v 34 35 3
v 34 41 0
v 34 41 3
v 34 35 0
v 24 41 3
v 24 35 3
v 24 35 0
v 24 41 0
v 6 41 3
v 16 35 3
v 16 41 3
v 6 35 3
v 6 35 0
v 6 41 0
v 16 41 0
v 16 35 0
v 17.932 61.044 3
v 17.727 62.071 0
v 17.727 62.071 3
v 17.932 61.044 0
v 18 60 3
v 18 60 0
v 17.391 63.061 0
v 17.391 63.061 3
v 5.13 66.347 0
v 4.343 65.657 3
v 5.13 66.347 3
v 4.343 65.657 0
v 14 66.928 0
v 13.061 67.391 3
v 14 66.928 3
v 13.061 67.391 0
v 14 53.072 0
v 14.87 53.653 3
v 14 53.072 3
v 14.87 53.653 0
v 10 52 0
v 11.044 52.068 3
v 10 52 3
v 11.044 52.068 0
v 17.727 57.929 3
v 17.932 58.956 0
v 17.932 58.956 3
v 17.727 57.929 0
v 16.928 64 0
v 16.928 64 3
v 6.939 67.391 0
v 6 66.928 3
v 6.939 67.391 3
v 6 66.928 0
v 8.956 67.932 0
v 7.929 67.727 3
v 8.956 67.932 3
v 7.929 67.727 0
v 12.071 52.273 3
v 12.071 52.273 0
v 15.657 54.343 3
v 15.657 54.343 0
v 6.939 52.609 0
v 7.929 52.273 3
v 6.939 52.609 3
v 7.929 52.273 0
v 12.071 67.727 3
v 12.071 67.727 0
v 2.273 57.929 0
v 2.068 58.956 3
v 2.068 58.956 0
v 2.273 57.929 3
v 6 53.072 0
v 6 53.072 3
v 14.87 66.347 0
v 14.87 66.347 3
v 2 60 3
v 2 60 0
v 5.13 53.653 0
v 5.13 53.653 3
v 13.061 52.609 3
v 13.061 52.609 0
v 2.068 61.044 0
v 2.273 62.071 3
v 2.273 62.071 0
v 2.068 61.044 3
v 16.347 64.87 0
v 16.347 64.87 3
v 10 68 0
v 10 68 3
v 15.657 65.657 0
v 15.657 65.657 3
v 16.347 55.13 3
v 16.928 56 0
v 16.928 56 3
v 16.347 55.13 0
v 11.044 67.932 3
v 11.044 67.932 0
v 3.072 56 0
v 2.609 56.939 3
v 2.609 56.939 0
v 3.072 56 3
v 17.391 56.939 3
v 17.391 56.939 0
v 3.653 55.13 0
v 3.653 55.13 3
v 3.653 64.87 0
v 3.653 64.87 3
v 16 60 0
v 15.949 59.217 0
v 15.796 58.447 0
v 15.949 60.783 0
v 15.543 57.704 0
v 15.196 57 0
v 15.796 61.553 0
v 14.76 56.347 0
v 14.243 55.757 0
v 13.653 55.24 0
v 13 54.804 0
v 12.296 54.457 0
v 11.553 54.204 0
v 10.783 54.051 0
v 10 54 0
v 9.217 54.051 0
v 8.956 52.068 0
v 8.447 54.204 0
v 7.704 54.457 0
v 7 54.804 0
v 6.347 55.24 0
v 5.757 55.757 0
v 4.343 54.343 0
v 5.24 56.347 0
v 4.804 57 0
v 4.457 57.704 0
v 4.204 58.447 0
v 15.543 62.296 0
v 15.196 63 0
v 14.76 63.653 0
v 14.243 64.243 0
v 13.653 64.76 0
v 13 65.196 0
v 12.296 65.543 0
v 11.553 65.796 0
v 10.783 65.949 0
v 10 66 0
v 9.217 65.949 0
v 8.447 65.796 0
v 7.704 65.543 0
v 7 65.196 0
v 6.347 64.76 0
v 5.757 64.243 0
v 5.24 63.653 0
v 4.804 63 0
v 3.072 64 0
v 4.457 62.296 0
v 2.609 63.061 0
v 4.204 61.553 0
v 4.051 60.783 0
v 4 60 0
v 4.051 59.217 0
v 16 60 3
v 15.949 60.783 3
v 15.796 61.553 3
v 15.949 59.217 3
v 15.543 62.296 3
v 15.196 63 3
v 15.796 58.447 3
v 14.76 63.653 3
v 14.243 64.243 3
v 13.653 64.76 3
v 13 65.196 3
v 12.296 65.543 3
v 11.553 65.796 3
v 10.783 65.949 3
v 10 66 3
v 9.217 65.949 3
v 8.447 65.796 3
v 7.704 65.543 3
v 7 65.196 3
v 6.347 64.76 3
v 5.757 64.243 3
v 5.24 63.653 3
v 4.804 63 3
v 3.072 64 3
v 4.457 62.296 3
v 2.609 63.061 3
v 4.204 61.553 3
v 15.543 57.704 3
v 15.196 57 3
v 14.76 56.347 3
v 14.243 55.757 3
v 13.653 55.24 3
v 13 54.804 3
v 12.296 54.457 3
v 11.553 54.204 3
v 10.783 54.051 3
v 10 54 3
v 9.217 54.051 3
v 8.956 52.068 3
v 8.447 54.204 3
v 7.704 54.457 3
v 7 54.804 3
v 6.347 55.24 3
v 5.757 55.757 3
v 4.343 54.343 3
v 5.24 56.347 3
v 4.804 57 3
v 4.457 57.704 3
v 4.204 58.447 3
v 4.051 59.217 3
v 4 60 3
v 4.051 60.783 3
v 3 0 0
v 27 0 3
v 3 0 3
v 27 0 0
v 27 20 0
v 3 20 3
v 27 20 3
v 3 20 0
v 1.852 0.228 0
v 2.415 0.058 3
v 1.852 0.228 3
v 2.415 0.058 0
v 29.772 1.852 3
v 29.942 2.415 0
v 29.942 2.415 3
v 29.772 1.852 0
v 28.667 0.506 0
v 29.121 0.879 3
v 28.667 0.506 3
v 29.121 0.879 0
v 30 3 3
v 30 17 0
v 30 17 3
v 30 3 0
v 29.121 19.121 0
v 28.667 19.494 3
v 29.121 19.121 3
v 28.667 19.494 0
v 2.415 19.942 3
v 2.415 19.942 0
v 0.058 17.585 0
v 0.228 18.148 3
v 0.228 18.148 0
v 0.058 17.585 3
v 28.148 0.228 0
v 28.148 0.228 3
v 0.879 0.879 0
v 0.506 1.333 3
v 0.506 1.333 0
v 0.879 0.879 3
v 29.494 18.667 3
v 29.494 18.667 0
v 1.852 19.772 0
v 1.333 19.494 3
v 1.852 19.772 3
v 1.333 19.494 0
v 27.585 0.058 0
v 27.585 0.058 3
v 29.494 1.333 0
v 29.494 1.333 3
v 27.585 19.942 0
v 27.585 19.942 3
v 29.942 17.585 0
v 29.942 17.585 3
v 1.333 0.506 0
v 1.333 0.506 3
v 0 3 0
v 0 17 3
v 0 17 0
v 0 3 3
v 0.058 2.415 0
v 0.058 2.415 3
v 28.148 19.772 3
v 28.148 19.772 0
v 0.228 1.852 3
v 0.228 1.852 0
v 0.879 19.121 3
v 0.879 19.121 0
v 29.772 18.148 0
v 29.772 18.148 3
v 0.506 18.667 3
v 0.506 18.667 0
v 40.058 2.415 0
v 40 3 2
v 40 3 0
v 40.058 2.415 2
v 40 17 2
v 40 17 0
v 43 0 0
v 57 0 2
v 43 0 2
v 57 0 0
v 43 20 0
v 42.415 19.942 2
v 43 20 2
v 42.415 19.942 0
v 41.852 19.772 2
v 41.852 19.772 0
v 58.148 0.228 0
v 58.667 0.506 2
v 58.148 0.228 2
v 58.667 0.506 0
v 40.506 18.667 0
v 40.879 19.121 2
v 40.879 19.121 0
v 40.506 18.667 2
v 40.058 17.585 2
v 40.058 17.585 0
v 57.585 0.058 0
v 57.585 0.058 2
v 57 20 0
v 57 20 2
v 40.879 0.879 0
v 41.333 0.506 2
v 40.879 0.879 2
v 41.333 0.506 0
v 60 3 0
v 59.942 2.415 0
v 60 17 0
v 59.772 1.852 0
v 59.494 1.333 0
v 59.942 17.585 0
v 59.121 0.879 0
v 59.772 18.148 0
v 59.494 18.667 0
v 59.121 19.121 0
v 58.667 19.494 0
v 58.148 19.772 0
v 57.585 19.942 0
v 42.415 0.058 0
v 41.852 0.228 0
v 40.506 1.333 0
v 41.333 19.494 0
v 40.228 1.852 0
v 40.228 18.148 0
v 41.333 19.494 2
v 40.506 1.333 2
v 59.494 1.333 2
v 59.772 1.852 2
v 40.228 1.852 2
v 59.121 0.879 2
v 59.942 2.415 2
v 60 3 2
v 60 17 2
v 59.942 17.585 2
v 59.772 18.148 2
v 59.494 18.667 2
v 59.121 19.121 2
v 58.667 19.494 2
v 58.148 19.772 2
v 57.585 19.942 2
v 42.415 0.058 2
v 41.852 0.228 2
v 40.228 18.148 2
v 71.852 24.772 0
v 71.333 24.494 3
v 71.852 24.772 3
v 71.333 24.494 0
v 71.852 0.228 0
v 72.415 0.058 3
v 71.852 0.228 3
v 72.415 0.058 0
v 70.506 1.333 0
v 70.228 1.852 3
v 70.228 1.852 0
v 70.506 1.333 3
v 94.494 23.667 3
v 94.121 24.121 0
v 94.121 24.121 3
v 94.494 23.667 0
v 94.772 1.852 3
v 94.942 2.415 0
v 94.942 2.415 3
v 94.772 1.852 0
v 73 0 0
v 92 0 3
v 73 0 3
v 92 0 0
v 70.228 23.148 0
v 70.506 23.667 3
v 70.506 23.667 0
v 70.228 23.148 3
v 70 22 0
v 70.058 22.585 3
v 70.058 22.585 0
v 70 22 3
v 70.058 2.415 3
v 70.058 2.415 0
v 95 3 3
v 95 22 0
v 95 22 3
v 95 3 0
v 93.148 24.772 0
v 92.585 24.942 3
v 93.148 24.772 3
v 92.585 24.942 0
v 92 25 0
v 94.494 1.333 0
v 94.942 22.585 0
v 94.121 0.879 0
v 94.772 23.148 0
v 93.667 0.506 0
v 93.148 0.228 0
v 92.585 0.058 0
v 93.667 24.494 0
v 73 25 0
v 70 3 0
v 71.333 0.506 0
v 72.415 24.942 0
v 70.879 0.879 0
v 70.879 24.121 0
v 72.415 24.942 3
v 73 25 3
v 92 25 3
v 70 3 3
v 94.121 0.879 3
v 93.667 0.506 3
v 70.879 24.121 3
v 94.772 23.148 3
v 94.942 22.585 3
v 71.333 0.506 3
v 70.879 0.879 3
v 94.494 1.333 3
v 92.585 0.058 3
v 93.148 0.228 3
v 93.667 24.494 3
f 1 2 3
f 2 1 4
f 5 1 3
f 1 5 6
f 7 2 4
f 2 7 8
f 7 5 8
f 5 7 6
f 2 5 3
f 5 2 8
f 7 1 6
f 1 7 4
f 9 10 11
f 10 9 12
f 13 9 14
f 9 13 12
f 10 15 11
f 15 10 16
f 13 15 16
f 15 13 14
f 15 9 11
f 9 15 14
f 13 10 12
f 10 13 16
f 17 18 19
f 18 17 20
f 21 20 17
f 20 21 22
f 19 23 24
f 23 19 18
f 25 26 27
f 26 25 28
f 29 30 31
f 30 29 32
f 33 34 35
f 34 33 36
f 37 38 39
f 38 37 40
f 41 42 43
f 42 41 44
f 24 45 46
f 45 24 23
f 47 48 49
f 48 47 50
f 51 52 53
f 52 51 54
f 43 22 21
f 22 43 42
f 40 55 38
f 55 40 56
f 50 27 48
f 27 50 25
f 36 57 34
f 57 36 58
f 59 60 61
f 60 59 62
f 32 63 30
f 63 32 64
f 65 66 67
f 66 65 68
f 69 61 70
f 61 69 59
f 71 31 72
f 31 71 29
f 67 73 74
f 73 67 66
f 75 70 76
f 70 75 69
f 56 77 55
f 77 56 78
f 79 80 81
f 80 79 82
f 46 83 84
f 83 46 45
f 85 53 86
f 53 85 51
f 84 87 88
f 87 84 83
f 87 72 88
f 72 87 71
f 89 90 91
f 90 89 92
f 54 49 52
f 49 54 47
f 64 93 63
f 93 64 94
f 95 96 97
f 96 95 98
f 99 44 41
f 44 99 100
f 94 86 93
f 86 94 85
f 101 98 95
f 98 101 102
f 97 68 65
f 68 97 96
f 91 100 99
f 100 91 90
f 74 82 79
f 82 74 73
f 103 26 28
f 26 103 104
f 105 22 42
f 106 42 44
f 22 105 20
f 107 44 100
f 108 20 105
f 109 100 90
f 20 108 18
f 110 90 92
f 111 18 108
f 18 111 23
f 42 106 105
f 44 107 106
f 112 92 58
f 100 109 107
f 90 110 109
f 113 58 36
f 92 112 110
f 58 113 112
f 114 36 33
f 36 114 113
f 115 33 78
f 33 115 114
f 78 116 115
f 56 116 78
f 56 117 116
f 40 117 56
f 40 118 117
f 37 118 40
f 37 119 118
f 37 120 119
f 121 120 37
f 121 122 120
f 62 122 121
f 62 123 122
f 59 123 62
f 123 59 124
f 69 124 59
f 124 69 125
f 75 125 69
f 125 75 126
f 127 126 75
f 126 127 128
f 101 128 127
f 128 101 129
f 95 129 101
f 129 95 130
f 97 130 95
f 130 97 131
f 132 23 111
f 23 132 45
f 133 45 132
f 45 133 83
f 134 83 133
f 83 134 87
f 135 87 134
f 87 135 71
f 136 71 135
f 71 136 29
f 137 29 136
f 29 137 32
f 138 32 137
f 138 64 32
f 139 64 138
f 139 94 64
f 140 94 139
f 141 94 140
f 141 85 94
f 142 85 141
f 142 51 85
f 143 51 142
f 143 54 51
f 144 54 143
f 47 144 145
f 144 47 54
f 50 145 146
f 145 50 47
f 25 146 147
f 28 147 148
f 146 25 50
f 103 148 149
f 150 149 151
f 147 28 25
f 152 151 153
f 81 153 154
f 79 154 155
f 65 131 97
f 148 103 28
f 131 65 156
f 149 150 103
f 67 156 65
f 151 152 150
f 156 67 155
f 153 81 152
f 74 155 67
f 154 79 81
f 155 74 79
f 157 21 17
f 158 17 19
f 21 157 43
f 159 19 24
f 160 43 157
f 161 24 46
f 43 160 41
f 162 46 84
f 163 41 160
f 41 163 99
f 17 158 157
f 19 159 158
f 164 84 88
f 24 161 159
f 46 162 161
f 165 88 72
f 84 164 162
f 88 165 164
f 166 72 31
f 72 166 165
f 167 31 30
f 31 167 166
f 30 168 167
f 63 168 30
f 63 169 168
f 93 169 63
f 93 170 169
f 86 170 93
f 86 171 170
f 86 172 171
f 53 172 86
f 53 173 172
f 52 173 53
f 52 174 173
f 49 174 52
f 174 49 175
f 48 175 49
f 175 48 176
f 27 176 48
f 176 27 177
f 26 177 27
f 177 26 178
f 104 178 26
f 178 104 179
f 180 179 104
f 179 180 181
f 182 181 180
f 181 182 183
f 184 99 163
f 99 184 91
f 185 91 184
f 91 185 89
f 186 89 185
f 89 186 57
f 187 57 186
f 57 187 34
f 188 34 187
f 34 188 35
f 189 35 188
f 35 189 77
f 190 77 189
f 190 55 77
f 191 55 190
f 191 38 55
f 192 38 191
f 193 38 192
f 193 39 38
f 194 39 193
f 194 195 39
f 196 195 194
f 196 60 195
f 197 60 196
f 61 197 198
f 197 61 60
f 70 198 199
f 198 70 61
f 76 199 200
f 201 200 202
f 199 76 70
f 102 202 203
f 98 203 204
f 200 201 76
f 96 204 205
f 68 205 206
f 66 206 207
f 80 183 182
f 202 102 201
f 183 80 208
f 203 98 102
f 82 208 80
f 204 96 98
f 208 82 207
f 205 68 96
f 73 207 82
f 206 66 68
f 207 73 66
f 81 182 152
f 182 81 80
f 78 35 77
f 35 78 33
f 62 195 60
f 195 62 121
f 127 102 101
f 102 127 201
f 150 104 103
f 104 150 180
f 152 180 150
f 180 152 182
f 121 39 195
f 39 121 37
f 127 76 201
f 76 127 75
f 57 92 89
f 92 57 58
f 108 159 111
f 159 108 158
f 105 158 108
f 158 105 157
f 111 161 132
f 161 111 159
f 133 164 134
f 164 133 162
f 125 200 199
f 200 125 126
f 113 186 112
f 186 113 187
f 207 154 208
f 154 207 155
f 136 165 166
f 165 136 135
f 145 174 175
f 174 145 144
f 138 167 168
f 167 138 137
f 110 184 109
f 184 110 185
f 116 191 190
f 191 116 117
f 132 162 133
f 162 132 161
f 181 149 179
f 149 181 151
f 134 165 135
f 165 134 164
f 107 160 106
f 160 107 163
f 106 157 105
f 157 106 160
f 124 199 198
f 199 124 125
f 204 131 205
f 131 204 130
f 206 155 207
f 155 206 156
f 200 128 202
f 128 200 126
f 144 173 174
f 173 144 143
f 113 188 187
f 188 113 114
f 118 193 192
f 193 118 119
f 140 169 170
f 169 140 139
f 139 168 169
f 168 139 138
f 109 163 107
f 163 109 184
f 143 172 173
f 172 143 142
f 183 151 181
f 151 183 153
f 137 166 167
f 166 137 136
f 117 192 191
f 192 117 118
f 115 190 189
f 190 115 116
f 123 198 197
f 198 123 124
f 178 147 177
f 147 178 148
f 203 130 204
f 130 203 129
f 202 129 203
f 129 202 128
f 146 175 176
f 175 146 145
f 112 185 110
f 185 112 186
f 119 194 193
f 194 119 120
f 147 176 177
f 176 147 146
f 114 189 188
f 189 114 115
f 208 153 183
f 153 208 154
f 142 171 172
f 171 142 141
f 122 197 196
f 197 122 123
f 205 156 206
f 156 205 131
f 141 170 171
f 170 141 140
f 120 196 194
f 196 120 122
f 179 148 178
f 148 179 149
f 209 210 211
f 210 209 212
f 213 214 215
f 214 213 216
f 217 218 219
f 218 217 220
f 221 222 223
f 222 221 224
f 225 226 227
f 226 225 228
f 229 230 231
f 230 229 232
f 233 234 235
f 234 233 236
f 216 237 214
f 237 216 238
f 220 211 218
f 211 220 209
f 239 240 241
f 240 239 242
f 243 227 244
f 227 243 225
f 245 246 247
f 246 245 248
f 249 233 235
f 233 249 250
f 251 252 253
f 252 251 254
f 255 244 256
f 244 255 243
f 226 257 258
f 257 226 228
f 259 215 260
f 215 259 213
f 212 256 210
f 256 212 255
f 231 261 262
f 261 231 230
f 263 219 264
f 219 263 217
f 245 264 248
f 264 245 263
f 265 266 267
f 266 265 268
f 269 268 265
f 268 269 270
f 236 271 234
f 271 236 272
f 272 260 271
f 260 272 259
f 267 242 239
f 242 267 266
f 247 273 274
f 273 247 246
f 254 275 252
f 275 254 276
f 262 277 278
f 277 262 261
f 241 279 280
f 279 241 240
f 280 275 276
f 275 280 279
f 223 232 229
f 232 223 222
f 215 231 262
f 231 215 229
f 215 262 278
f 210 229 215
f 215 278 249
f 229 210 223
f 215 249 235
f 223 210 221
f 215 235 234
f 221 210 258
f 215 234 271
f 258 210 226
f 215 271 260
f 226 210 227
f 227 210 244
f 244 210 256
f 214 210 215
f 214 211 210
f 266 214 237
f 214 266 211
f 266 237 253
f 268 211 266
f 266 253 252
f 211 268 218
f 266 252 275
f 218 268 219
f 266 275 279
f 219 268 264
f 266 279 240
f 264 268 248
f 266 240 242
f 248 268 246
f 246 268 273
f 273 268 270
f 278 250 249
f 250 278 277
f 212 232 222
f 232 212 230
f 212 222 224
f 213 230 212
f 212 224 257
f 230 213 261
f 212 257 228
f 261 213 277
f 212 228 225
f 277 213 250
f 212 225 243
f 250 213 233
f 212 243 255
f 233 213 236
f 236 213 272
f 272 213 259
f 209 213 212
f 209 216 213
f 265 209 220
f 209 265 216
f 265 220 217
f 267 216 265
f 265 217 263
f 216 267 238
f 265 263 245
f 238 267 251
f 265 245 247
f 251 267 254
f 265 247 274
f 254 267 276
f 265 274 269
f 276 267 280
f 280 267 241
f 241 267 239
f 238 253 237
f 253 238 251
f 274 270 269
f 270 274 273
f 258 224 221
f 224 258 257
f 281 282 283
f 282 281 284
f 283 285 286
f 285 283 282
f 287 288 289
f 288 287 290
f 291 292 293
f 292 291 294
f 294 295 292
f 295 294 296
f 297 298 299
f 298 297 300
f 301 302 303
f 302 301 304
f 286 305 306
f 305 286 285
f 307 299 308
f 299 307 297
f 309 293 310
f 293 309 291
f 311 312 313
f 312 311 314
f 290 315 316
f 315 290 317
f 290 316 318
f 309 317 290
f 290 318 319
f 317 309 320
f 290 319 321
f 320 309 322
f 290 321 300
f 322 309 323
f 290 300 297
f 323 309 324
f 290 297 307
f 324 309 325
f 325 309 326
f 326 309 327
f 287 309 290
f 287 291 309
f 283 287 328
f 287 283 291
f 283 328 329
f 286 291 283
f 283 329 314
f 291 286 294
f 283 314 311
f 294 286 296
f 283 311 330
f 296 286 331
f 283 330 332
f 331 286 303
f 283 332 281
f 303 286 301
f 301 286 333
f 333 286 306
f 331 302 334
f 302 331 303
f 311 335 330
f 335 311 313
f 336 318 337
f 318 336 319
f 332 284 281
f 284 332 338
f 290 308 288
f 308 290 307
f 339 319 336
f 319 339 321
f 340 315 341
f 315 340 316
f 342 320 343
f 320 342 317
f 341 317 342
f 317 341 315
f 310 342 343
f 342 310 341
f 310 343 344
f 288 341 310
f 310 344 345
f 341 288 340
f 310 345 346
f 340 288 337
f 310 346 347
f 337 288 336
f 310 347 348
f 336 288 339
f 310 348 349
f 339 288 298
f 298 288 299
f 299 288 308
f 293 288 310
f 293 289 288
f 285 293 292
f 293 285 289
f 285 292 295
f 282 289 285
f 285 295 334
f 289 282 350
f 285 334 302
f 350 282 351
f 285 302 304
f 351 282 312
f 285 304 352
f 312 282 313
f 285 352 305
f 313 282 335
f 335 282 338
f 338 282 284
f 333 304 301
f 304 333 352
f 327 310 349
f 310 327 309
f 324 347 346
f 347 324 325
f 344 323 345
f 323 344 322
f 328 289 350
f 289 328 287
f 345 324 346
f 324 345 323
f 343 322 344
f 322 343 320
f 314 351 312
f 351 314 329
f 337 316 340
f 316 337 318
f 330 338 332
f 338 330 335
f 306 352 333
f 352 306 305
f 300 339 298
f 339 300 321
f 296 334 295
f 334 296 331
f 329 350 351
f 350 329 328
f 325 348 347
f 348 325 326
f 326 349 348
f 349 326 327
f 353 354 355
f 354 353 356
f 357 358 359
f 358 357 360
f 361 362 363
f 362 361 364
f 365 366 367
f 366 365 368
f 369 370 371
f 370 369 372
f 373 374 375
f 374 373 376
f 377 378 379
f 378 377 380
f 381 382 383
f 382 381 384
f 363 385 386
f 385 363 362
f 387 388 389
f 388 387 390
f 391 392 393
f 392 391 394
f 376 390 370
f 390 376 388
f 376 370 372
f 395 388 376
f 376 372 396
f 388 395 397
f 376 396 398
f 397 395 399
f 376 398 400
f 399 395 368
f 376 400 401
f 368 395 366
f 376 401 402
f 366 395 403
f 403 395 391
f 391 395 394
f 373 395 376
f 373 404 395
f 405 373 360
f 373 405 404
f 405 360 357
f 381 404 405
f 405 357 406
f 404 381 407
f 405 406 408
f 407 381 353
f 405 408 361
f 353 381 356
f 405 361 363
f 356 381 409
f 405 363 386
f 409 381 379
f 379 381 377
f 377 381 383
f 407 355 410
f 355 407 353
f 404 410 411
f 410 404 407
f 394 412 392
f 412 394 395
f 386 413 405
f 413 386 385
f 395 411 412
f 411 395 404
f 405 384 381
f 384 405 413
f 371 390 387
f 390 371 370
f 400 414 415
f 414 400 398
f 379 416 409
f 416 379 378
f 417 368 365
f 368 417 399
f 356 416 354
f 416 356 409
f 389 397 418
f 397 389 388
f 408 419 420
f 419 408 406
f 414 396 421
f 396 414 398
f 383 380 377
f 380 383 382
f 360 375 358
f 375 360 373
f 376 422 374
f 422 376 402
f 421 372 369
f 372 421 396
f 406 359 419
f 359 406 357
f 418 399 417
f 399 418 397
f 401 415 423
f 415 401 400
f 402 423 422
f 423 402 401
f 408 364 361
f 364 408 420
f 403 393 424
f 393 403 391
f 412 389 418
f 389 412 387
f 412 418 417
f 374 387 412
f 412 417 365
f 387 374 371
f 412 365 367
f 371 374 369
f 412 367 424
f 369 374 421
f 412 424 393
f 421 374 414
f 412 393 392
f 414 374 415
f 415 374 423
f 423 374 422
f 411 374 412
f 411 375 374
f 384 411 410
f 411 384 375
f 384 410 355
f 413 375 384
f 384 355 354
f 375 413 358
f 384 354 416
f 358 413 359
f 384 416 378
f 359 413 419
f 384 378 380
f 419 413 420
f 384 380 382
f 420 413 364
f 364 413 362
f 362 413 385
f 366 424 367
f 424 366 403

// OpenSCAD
// file: 04-library.scad
// A small library for lesson 4. Open 04-modules-and-functions.scad, not this.
//
// It holds four kinds of thing, so lesson 4 can show which of them `use`
// brings across: a module, a function, a variable, and some top-level geometry.

library_version = 1;

module ring(d = 12, t = 2, h = 3) {
    difference() {
        cylinder(h = h, d = d, $fn = 48);
        translate([0, 0, -0.01])
            cylinder(h = h + 0.02, d = d - 2 * t, $fn = 48);
    }
}

function clearance_d(nominal, comp = 0.15) = nominal + 2 * comp;

// Top-level geometry: drawn when you open THIS file, and when a file INCLUDES
// it. A file that USES it never sees this sphere.
translate([0, 0, 20])
    sphere(d = 30, $fn = 48);
// main file
// Lesson 4 - modules and functions
//
// A MODULE makes geometry. A FUNCTION returns a value. They cannot swap roles:
// a function cannot draw anything, and a module cannot return a number.

use <04-library.scad>

// ---------------------------------------------------------------------------
// 1. A module with parameters and defaults                           (row y = 0)
// ---------------------------------------------------------------------------
// A plate with rounded corners: hull() around four cylinders (lesson 2).
// `for (x = ..., y = ...)` loops over every combination of x and y.
module plate(w = 30, d = 20, t = 3, r = 3) {
    hull()
        for (x = [r, w - r], y = [r, d - r])
            translate([x, y, 0])
                cylinder(h = t, r = r, $fn = 32);
}

plate();                                 // every default

translate([40, 0, 0])
    plate(w = 20, t = 2);                // named arguments, in any order

translate([70, 0, 0])
    plate(25, 25);                       // positional: w first, then d

// ---------------------------------------------------------------------------
// 2. A module that wraps other geometry: children()                  (row y = 35)
// ---------------------------------------------------------------------------
// children() stands for whatever the caller put after the module call. That is
// how you write your own transforms. This one draws its children, plus a mirror
// image of them - handy for any symmetric part.
module mirror_copy(axis = [1, 0, 0]) {
    children();
    mirror(axis)
        children();
}

translate([20, 35, 0])
    mirror_copy()
        translate([4, 0, 0])
            cube([10, 6, 3]);

// ---------------------------------------------------------------------------
// 3. Functions: one expression that returns a value
// ---------------------------------------------------------------------------
// Walls on this printer are designed in whole extrusion widths
// (docs/fdm-design-rules.md §1). Two small functions make that arithmetic
// readable:
bead = 0.45;
function wall_for(perimeters) = perimeters * bead;
function perimeters_in(wall) = wall / bead;

echo(wall_for_4_perimeters = wall_for(4));           // 1.8
echo(perimeters_in_2_25 = perimeters_in(2.25));      // 5

// A function can call itself - that is how you loop in an expression (lesson 3).
function count_down(n) = n <= 0 ? [] : concat([n], count_down(n - 1));
echo(count_down = count_down(4));                    // [4, 3, 2, 1]

// ---------------------------------------------------------------------------
// 4. Code from another file: `use` versus `include`                  (row y = 55)
// ---------------------------------------------------------------------------
// Measured on both builds:
//                 modules and functions   variables   top-level geometry
//   include <f>          yes                 yes       YES - drawn here too
//   use <f>              yes                 no        no
//
// `use` is for libraries: you want the tools, not the demo. `include` is for
// settings files, whose whole point is the variables - which is why lesson 6's
// model includes its .params.scad file.
//
// This file USES 04-library.scad (top of the file). So ring() and clearance_d()
// work here, but library_version is undefined and the library's sphere is absent.
translate([10, 60, 0])
    ring(d = 16);

echo(m3_clearance = clearance_d(3.2));               // 3.5
echo(library_version_is_undef = is_undef(library_version));   // true

// ---------------------------------------------------------------------------
// TRY
// ---------------------------------------------------------------------------
//  1. Give plate() a `holes = true` parameter that cuts a 3 mm hole in from each
//     corner. Remember to make the holes overshoot the plate.
//  2. Change `use` to `include` at the top of this file and press F5. What
//     appears, and what does the console now say about library_version?
//  3. Write a module grid(nx, ny, pitch) that places copies of its children on a
//     grid. Use it to lay out 3 x 2 of the rings.
